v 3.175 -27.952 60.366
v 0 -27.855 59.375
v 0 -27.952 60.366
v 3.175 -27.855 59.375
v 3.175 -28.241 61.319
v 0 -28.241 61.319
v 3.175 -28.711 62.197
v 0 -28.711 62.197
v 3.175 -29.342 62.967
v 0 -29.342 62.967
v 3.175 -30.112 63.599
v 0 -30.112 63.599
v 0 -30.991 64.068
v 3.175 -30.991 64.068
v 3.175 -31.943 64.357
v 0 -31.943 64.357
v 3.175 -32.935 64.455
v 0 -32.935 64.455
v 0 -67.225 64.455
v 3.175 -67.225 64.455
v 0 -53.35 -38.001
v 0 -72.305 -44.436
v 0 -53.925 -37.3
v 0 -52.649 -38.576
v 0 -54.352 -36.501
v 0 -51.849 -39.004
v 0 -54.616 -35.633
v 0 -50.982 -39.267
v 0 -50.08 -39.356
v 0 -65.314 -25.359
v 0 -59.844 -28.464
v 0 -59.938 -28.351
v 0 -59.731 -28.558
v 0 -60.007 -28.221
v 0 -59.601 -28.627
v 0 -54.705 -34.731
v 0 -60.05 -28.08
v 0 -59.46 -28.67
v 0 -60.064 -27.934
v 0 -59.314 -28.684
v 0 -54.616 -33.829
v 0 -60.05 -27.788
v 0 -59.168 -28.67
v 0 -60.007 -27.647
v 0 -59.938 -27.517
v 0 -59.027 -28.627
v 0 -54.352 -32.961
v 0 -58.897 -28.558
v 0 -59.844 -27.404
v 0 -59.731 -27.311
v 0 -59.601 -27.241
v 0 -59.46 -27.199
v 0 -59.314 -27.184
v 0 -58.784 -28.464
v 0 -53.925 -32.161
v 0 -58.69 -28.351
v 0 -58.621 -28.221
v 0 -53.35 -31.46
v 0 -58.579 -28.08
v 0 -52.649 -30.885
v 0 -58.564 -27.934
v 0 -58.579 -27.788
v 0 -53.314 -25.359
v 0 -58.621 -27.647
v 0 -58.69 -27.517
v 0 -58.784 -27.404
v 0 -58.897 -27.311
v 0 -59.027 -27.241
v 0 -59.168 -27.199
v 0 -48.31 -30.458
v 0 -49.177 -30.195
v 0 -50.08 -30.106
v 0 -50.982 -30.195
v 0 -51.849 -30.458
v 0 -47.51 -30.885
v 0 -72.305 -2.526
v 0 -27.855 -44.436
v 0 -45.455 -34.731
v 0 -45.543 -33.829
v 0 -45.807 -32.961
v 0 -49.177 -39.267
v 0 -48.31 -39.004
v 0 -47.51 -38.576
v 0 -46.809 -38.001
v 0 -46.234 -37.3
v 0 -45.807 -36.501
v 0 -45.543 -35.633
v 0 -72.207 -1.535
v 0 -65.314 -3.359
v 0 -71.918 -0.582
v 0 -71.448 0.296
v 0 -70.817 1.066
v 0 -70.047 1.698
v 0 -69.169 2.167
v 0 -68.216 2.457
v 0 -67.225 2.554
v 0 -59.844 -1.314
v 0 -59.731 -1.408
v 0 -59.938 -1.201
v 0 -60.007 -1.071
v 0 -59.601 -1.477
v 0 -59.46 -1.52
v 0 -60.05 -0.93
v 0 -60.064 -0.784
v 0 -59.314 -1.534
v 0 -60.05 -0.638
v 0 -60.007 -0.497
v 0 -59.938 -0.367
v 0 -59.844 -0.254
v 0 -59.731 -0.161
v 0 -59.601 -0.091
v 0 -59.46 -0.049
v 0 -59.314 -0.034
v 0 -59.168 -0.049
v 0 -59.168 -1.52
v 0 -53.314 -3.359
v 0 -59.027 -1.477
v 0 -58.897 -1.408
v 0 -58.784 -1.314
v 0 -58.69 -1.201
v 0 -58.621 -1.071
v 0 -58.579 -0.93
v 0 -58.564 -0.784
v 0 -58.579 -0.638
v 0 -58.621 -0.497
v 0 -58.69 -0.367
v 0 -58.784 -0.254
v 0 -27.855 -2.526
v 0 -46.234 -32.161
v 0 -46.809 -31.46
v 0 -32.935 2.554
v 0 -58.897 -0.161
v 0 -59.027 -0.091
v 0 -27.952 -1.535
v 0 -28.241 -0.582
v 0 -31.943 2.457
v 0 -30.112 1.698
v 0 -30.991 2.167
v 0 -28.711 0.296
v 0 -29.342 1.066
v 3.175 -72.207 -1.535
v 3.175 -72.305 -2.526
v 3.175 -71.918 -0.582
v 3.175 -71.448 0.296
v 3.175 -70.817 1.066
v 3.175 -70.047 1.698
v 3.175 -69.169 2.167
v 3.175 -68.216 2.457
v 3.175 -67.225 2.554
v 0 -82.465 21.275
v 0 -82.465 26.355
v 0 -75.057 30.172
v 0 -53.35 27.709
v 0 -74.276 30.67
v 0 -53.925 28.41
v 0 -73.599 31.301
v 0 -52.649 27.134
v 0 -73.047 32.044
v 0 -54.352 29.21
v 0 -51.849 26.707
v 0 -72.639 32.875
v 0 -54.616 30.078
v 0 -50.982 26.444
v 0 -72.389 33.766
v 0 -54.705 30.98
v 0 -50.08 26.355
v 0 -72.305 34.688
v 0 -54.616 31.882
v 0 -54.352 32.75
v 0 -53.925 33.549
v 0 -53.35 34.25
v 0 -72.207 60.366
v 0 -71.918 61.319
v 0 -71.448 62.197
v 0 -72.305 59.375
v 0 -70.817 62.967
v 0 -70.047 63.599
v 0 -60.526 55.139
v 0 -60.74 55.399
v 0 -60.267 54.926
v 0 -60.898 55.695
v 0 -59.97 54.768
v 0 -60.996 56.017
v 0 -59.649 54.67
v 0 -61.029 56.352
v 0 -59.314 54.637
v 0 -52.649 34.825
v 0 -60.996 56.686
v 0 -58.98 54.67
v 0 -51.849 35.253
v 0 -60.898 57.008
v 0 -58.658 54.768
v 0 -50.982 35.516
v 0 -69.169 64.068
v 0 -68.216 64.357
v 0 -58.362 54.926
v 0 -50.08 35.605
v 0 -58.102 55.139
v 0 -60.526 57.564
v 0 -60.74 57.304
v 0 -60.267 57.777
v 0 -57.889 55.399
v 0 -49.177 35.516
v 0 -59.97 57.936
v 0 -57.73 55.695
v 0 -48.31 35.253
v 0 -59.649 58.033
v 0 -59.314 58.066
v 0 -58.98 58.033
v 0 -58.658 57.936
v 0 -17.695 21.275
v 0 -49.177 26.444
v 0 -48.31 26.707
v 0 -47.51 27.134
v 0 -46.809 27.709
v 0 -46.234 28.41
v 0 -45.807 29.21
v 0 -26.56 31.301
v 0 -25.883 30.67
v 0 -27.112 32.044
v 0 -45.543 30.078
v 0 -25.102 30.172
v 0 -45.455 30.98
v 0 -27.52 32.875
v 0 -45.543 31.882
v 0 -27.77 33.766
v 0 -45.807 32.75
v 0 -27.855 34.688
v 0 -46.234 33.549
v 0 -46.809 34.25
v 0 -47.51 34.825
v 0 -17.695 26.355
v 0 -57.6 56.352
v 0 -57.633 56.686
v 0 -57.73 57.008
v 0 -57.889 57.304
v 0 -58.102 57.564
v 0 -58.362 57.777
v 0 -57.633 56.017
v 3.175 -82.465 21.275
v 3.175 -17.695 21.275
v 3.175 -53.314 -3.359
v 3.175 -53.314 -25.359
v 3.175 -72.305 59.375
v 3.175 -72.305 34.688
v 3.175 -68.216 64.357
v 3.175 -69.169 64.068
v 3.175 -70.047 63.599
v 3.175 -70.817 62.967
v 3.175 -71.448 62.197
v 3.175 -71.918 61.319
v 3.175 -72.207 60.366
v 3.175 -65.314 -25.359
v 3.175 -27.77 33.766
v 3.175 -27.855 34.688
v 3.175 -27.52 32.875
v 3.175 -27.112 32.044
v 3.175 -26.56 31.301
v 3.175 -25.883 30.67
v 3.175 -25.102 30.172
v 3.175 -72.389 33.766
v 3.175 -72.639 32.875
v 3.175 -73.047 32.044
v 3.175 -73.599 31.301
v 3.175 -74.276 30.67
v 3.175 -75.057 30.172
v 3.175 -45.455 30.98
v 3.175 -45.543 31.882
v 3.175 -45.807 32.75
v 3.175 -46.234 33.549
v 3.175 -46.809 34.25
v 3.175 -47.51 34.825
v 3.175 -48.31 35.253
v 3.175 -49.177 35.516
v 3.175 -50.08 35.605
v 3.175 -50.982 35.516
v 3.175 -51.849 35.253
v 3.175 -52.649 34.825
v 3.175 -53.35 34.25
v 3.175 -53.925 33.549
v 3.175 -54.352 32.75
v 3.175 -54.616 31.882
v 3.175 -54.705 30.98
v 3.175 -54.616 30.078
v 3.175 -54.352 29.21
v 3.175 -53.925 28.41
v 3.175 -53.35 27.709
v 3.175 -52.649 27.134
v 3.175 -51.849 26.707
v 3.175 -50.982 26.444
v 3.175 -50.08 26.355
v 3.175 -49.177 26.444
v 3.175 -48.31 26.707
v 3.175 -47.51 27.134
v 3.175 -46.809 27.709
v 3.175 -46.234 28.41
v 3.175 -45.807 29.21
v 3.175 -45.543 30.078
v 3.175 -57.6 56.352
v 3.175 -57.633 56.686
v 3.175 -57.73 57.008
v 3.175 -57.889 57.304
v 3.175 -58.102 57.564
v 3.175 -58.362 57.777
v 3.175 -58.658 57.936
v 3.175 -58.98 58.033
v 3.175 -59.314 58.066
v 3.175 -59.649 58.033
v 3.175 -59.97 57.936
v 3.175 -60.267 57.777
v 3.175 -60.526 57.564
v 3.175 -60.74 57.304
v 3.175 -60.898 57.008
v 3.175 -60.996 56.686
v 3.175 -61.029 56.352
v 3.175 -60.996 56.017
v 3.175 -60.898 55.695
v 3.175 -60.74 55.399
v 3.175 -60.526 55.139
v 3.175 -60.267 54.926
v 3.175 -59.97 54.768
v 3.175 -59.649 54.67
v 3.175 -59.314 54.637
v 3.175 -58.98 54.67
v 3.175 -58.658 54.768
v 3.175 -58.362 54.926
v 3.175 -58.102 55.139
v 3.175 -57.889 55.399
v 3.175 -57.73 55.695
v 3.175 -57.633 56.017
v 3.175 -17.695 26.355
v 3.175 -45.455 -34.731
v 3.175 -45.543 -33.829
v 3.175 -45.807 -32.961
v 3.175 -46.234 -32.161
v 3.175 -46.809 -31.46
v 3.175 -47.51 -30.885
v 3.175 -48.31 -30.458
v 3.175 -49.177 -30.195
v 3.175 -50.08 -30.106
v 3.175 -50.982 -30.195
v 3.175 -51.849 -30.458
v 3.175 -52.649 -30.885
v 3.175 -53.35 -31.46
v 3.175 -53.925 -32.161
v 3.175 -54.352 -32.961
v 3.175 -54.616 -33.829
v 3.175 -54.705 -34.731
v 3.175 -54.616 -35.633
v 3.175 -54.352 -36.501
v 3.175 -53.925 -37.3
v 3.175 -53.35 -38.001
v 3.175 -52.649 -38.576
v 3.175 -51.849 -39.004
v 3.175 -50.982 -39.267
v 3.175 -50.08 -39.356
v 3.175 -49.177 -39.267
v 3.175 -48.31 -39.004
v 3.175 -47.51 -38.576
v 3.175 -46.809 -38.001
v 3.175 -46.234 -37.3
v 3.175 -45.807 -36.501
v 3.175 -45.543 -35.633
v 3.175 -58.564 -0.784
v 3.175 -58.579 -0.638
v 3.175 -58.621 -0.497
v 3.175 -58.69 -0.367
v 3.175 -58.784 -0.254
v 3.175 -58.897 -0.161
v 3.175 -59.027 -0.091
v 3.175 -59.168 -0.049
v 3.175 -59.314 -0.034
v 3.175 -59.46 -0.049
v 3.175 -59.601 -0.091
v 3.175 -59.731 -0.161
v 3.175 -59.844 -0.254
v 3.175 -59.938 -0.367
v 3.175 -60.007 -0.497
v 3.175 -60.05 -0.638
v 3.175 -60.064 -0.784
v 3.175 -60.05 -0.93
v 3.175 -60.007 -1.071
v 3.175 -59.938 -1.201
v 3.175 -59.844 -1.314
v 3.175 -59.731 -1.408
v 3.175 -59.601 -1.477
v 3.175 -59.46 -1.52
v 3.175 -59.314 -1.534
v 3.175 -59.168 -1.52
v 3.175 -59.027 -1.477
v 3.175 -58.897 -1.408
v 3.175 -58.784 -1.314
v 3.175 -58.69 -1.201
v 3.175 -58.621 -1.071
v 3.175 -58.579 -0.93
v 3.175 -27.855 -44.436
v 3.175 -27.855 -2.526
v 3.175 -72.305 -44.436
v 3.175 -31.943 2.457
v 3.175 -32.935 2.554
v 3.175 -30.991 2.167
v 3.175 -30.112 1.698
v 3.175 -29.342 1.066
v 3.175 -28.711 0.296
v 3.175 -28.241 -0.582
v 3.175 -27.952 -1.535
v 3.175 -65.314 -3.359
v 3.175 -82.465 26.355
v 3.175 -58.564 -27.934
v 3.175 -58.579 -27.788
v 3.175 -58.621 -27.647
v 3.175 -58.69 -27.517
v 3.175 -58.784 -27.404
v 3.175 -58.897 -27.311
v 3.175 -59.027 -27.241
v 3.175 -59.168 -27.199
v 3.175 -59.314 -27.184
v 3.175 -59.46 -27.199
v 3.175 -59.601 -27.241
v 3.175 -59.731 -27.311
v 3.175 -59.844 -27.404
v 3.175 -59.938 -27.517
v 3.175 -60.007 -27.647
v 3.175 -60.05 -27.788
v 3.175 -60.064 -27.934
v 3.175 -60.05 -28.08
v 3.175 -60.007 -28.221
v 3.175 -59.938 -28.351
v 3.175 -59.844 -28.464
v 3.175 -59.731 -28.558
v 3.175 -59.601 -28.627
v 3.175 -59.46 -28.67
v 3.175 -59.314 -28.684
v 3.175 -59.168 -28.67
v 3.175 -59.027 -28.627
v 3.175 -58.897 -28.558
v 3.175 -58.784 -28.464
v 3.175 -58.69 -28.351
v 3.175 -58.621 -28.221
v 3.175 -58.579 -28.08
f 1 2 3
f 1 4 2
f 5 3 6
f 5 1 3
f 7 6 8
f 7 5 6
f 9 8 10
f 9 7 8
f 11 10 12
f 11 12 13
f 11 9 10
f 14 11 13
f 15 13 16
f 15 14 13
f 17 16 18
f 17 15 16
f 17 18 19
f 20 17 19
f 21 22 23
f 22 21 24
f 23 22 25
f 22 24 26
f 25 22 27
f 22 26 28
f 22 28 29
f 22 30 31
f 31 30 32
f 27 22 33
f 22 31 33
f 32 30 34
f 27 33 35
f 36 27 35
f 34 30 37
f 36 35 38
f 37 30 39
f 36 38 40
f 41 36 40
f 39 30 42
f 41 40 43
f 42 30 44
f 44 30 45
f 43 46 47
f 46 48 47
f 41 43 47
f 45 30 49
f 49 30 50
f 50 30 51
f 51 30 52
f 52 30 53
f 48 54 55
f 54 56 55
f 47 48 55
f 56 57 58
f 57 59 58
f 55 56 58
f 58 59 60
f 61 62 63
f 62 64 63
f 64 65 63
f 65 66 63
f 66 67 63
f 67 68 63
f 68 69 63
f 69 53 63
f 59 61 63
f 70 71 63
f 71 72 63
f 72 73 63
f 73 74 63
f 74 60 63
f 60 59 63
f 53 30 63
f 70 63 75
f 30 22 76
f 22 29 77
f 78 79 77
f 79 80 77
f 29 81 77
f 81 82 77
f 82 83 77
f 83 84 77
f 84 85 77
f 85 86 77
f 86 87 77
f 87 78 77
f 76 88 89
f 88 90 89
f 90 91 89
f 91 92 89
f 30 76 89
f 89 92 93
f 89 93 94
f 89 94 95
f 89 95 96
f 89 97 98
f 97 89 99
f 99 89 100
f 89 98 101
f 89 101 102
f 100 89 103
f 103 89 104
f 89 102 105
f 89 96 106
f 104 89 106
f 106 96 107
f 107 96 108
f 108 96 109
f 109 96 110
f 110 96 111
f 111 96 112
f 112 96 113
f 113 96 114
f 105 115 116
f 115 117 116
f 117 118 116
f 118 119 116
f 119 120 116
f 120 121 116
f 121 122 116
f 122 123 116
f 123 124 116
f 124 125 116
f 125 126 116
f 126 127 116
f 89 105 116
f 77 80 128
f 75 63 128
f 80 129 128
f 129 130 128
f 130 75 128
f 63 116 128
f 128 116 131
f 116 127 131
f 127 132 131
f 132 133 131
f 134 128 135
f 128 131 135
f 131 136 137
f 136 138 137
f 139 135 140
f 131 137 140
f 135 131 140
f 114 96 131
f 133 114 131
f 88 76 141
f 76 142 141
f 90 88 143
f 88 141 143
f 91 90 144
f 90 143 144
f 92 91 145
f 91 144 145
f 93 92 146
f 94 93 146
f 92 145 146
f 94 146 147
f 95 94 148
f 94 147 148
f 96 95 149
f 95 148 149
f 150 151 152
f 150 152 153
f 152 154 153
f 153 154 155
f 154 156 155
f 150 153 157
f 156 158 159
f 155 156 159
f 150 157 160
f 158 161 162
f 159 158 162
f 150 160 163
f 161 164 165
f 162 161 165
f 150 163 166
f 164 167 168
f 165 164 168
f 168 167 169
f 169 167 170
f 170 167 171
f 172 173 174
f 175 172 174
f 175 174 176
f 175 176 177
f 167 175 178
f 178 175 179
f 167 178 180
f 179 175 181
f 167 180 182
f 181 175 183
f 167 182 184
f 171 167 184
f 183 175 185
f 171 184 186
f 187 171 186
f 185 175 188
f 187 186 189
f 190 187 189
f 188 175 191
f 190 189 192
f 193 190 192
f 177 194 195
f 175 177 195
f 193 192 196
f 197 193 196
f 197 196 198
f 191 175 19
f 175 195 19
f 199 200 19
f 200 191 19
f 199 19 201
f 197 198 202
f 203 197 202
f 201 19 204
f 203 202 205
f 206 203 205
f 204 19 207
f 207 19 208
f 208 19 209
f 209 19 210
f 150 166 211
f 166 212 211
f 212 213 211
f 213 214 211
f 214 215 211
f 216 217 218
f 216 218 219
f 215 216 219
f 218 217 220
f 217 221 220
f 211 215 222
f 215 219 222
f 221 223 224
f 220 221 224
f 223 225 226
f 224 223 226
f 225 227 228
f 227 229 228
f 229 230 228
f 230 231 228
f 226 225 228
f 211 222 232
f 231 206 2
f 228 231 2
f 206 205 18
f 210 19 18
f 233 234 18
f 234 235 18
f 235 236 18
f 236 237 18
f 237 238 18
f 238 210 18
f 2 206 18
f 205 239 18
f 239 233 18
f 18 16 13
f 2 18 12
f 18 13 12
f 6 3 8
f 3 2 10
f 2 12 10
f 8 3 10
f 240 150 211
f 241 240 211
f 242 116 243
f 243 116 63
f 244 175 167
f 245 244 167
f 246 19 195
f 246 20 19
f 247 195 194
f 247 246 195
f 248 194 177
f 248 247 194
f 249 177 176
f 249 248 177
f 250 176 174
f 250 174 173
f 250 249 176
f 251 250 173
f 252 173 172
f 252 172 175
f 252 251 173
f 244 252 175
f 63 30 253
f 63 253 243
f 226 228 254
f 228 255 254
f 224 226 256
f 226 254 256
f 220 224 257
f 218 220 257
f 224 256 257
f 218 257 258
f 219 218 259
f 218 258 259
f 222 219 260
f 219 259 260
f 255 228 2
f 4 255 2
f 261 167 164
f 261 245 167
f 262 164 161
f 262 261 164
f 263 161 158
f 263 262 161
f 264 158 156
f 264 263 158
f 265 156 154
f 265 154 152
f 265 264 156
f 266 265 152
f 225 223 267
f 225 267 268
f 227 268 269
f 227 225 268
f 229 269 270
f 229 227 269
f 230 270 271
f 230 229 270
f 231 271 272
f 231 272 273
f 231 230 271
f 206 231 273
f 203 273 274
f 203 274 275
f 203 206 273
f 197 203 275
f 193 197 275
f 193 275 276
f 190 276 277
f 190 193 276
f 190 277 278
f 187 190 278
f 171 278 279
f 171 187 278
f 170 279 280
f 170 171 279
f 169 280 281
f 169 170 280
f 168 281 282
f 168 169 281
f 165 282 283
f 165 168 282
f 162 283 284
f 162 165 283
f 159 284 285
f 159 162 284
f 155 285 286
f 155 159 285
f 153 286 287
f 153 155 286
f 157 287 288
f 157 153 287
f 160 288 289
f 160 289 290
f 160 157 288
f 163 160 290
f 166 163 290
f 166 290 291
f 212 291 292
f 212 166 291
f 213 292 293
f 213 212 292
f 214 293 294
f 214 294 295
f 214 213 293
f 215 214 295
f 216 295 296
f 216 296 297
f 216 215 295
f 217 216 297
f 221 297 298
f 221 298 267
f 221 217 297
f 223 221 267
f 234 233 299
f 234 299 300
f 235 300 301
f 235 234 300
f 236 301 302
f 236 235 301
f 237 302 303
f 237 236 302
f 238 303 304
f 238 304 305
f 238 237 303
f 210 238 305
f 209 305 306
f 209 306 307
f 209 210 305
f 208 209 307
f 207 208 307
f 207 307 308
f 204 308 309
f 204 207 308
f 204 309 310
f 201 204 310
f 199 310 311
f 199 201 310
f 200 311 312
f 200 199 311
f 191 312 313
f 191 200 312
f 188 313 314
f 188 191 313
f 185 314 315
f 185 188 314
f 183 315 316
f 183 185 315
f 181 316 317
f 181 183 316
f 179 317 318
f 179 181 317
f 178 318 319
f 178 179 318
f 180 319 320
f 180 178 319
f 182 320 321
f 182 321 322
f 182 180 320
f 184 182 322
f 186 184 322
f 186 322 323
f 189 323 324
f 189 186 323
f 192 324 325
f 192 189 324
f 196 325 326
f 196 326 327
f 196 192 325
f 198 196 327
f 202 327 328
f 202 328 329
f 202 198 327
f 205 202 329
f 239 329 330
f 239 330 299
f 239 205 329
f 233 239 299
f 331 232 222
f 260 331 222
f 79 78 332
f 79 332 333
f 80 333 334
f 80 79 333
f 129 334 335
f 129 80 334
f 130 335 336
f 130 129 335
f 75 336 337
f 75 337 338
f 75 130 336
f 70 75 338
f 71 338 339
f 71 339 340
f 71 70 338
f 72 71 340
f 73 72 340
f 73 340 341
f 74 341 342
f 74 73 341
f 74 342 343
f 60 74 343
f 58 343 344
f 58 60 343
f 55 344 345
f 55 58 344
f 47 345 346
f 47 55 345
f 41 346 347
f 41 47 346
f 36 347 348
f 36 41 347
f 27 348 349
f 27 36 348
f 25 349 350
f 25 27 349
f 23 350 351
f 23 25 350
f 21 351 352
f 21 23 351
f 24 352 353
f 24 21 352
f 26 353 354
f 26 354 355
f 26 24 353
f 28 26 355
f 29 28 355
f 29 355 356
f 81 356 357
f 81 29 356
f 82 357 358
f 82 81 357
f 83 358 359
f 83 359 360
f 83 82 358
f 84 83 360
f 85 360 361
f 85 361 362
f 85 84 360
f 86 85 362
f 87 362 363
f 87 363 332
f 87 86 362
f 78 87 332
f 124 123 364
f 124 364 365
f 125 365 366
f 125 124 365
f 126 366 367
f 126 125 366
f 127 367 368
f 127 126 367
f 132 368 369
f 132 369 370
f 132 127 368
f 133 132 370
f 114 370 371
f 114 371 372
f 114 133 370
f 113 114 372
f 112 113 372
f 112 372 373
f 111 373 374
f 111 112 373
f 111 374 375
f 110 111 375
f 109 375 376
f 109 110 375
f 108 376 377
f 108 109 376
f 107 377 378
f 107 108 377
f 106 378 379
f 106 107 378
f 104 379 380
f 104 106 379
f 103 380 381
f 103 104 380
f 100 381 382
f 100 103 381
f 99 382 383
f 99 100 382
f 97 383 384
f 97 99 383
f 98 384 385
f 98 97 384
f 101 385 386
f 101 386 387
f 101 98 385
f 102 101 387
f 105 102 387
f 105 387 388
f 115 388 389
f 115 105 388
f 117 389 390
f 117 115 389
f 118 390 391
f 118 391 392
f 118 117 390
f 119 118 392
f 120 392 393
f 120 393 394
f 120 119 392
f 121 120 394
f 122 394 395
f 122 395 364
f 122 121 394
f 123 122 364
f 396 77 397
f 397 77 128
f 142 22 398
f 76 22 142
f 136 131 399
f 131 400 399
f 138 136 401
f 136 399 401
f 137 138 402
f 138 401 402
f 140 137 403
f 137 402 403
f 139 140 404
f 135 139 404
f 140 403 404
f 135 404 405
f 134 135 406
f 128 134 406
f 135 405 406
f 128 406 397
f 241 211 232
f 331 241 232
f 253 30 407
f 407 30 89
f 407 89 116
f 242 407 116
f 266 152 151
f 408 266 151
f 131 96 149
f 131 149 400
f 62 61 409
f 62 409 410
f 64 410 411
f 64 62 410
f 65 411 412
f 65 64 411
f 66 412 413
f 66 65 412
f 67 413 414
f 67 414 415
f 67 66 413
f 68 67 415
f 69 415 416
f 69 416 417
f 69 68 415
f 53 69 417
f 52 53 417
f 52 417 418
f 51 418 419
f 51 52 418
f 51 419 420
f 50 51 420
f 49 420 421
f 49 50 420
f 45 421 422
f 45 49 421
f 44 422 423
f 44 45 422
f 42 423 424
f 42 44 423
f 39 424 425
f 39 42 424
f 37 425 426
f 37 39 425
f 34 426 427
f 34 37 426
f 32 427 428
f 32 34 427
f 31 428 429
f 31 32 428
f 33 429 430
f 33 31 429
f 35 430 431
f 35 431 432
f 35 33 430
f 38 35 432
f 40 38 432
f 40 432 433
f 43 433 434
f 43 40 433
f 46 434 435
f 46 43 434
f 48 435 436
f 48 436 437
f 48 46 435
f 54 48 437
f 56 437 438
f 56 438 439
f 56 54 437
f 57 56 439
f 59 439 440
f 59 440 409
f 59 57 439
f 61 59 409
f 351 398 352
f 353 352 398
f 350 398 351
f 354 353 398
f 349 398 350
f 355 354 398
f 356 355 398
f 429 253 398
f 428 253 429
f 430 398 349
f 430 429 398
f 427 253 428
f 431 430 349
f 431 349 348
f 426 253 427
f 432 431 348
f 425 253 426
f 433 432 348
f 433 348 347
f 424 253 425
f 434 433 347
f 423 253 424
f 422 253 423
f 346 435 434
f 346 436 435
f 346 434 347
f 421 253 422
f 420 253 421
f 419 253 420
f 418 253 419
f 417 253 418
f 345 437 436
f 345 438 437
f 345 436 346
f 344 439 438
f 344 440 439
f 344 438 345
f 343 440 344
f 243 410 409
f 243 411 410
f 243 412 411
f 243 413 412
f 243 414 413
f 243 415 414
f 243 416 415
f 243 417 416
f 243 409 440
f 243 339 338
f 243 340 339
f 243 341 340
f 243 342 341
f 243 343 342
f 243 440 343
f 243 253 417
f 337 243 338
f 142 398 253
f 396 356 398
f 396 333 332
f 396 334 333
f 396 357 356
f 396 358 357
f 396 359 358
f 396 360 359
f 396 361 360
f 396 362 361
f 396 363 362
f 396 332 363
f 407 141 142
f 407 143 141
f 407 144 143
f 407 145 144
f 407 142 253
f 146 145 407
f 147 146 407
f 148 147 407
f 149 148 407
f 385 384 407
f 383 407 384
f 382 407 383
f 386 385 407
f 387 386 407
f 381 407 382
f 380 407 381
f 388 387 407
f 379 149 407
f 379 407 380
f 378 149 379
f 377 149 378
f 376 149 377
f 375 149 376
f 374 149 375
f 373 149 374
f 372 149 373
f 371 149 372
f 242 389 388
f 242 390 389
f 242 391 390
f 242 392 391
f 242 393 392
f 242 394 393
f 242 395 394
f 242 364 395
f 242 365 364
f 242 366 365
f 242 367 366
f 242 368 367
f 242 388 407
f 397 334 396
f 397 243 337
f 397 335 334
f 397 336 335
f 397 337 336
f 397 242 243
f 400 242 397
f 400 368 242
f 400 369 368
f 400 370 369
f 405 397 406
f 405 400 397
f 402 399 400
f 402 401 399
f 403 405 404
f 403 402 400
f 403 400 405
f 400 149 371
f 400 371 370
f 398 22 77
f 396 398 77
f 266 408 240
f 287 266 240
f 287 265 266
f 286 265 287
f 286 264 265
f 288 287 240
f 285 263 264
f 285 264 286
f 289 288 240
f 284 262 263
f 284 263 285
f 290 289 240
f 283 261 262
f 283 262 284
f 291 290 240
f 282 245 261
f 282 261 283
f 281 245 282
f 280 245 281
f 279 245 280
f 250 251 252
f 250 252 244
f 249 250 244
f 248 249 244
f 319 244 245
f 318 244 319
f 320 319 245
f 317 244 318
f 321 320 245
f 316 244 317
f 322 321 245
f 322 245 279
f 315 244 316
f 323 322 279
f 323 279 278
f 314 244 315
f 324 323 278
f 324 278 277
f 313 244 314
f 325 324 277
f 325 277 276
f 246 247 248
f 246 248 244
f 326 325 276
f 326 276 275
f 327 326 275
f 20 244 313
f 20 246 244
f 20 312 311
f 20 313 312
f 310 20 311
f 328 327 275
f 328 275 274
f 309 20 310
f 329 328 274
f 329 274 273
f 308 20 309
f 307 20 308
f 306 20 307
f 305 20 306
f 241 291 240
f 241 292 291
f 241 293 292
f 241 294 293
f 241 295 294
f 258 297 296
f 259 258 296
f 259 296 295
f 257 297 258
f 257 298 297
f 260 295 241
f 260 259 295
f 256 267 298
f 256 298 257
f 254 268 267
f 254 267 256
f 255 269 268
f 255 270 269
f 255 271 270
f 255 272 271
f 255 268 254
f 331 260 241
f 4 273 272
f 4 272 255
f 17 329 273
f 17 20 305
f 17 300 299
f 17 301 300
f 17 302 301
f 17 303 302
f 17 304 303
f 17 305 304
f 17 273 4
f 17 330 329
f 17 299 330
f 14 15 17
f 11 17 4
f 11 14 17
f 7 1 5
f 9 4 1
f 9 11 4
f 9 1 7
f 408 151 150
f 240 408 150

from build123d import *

# Parameters (mm, degrees)
F0_R     = 4.625
F0_R_2   = 1.7145
F1_DEPTH = 3.175
F0_W     = 44.45
F0_H     = 46.99
F0_R_3   = 0.75
F0_W_2   = 12
F0_H_2   = 5.15
F2_R     = 5.08
F2_2_R   = 5.08


# Not quite as in the source:
# - a feature names something its author has since deleted; it is built from what else it names


with BuildPart() as f1:
    # F0 (on Right) → F1 (new body)
    with BuildSketch(Plane.YZ):
        Polygon((-72.304546833, 31.5911603894), (-72.304546833, 21.2748162448), (-27.854546833, 21.2748162448), (-27.854546833, 31.5911603894), (-27.854546833, 64.4548162448), (-59.604546833, 64.4548162448), (-61.3806888302, 64.4548162448), (-72.304546833, 64.4548162448), align=None)
        with Locations((-50.079546833, 30.9798162448)):
            Circle(F0_R, mode=Mode.SUBTRACT)
        with Locations((-59.3140907028, 56.3515170061)):
            Circle(F0_R_2, mode=Mode.SUBTRACT)
        Polygon((-82.464546833, 21.2748162448), (-72.304546833, 21.2748162448), (-72.304546833, 31.5911603894), (-82.464546833, 26.3548162448), align=None)
        Polygon((-27.854546833, 31.5911603894), (-27.854546833, 21.2748162448), (-17.694546833, 21.2748162448), (-17.694546833, 26.3548162448), align=None)
    extrude(amount=F1_DEPTH)

    # F2
    f2_edges = [f1.edges().sort_by_distance(p)[0] for p in [
        (1.5875, -27.854547, 64.454816),
        (1.5875, -72.304547, 64.454816),
        (1.5875, -27.854547, 31.59116),
        (1.5875, -72.304547, 31.59116),
    ]]
    fillet(f2_edges, radius=F2_R)


with BuildPart() as f1b:
    # F0 (on Right) → F1, piece 2 (new body)
    with BuildSketch(Plane.YZ):
        with Locations((-50.079546833, -20.9408289242)):
            Rectangle(F0_W, F0_H)
        Polygon((-53.3140907028, -9.359128163), (-53.3140907028, -25.359128163), (-53.3140907028, -30.509128163), (-65.3140907028, -30.509128163), (-65.3140907028, -25.359128163), (-65.3140907028, -9.359128163), (-65.3140907028, -3.359128163), (-65.3140907028, 1.790871837), (-53.3140907028, 1.790871837), (-53.3140907028, -3.359128163), align=None, mode=Mode.SUBTRACT)
        with Locations((-50.079546833, -34.7308289242)):
            Circle(F0_R, mode=Mode.SUBTRACT)
        Polygon((-59.3140907028, -3.359128163), (-53.3140907028, -3.359128163), (-53.3140907028, 1.790871837), (-65.3140907028, 1.790871837), (-65.3140907028, -3.359128163), align=None)
        with Locations((-59.3140907028, -0.784128163)):
            Circle(F0_R_3, mode=Mode.SUBTRACT)
        with Locations((-59.3140907028, -27.934128163)):
            Rectangle(F0_W_2, F0_H_2)
        with Locations((-59.3140907028, -27.934128163)):
            Circle(F0_R_3, mode=Mode.SUBTRACT)
    extrude(amount=F1_DEPTH)

    # F2#2
    f2_2_edges = [f1b.edges().sort_by_distance(p)[0] for p in [
        (1.5875, -72.304547, 2.554171),
        (1.5875, -27.854547, 2.554171),
    ]]
    fillet(f2_2_edges, radius=F2_2_R)


solid = Compound([f1.part, f1b.part])
